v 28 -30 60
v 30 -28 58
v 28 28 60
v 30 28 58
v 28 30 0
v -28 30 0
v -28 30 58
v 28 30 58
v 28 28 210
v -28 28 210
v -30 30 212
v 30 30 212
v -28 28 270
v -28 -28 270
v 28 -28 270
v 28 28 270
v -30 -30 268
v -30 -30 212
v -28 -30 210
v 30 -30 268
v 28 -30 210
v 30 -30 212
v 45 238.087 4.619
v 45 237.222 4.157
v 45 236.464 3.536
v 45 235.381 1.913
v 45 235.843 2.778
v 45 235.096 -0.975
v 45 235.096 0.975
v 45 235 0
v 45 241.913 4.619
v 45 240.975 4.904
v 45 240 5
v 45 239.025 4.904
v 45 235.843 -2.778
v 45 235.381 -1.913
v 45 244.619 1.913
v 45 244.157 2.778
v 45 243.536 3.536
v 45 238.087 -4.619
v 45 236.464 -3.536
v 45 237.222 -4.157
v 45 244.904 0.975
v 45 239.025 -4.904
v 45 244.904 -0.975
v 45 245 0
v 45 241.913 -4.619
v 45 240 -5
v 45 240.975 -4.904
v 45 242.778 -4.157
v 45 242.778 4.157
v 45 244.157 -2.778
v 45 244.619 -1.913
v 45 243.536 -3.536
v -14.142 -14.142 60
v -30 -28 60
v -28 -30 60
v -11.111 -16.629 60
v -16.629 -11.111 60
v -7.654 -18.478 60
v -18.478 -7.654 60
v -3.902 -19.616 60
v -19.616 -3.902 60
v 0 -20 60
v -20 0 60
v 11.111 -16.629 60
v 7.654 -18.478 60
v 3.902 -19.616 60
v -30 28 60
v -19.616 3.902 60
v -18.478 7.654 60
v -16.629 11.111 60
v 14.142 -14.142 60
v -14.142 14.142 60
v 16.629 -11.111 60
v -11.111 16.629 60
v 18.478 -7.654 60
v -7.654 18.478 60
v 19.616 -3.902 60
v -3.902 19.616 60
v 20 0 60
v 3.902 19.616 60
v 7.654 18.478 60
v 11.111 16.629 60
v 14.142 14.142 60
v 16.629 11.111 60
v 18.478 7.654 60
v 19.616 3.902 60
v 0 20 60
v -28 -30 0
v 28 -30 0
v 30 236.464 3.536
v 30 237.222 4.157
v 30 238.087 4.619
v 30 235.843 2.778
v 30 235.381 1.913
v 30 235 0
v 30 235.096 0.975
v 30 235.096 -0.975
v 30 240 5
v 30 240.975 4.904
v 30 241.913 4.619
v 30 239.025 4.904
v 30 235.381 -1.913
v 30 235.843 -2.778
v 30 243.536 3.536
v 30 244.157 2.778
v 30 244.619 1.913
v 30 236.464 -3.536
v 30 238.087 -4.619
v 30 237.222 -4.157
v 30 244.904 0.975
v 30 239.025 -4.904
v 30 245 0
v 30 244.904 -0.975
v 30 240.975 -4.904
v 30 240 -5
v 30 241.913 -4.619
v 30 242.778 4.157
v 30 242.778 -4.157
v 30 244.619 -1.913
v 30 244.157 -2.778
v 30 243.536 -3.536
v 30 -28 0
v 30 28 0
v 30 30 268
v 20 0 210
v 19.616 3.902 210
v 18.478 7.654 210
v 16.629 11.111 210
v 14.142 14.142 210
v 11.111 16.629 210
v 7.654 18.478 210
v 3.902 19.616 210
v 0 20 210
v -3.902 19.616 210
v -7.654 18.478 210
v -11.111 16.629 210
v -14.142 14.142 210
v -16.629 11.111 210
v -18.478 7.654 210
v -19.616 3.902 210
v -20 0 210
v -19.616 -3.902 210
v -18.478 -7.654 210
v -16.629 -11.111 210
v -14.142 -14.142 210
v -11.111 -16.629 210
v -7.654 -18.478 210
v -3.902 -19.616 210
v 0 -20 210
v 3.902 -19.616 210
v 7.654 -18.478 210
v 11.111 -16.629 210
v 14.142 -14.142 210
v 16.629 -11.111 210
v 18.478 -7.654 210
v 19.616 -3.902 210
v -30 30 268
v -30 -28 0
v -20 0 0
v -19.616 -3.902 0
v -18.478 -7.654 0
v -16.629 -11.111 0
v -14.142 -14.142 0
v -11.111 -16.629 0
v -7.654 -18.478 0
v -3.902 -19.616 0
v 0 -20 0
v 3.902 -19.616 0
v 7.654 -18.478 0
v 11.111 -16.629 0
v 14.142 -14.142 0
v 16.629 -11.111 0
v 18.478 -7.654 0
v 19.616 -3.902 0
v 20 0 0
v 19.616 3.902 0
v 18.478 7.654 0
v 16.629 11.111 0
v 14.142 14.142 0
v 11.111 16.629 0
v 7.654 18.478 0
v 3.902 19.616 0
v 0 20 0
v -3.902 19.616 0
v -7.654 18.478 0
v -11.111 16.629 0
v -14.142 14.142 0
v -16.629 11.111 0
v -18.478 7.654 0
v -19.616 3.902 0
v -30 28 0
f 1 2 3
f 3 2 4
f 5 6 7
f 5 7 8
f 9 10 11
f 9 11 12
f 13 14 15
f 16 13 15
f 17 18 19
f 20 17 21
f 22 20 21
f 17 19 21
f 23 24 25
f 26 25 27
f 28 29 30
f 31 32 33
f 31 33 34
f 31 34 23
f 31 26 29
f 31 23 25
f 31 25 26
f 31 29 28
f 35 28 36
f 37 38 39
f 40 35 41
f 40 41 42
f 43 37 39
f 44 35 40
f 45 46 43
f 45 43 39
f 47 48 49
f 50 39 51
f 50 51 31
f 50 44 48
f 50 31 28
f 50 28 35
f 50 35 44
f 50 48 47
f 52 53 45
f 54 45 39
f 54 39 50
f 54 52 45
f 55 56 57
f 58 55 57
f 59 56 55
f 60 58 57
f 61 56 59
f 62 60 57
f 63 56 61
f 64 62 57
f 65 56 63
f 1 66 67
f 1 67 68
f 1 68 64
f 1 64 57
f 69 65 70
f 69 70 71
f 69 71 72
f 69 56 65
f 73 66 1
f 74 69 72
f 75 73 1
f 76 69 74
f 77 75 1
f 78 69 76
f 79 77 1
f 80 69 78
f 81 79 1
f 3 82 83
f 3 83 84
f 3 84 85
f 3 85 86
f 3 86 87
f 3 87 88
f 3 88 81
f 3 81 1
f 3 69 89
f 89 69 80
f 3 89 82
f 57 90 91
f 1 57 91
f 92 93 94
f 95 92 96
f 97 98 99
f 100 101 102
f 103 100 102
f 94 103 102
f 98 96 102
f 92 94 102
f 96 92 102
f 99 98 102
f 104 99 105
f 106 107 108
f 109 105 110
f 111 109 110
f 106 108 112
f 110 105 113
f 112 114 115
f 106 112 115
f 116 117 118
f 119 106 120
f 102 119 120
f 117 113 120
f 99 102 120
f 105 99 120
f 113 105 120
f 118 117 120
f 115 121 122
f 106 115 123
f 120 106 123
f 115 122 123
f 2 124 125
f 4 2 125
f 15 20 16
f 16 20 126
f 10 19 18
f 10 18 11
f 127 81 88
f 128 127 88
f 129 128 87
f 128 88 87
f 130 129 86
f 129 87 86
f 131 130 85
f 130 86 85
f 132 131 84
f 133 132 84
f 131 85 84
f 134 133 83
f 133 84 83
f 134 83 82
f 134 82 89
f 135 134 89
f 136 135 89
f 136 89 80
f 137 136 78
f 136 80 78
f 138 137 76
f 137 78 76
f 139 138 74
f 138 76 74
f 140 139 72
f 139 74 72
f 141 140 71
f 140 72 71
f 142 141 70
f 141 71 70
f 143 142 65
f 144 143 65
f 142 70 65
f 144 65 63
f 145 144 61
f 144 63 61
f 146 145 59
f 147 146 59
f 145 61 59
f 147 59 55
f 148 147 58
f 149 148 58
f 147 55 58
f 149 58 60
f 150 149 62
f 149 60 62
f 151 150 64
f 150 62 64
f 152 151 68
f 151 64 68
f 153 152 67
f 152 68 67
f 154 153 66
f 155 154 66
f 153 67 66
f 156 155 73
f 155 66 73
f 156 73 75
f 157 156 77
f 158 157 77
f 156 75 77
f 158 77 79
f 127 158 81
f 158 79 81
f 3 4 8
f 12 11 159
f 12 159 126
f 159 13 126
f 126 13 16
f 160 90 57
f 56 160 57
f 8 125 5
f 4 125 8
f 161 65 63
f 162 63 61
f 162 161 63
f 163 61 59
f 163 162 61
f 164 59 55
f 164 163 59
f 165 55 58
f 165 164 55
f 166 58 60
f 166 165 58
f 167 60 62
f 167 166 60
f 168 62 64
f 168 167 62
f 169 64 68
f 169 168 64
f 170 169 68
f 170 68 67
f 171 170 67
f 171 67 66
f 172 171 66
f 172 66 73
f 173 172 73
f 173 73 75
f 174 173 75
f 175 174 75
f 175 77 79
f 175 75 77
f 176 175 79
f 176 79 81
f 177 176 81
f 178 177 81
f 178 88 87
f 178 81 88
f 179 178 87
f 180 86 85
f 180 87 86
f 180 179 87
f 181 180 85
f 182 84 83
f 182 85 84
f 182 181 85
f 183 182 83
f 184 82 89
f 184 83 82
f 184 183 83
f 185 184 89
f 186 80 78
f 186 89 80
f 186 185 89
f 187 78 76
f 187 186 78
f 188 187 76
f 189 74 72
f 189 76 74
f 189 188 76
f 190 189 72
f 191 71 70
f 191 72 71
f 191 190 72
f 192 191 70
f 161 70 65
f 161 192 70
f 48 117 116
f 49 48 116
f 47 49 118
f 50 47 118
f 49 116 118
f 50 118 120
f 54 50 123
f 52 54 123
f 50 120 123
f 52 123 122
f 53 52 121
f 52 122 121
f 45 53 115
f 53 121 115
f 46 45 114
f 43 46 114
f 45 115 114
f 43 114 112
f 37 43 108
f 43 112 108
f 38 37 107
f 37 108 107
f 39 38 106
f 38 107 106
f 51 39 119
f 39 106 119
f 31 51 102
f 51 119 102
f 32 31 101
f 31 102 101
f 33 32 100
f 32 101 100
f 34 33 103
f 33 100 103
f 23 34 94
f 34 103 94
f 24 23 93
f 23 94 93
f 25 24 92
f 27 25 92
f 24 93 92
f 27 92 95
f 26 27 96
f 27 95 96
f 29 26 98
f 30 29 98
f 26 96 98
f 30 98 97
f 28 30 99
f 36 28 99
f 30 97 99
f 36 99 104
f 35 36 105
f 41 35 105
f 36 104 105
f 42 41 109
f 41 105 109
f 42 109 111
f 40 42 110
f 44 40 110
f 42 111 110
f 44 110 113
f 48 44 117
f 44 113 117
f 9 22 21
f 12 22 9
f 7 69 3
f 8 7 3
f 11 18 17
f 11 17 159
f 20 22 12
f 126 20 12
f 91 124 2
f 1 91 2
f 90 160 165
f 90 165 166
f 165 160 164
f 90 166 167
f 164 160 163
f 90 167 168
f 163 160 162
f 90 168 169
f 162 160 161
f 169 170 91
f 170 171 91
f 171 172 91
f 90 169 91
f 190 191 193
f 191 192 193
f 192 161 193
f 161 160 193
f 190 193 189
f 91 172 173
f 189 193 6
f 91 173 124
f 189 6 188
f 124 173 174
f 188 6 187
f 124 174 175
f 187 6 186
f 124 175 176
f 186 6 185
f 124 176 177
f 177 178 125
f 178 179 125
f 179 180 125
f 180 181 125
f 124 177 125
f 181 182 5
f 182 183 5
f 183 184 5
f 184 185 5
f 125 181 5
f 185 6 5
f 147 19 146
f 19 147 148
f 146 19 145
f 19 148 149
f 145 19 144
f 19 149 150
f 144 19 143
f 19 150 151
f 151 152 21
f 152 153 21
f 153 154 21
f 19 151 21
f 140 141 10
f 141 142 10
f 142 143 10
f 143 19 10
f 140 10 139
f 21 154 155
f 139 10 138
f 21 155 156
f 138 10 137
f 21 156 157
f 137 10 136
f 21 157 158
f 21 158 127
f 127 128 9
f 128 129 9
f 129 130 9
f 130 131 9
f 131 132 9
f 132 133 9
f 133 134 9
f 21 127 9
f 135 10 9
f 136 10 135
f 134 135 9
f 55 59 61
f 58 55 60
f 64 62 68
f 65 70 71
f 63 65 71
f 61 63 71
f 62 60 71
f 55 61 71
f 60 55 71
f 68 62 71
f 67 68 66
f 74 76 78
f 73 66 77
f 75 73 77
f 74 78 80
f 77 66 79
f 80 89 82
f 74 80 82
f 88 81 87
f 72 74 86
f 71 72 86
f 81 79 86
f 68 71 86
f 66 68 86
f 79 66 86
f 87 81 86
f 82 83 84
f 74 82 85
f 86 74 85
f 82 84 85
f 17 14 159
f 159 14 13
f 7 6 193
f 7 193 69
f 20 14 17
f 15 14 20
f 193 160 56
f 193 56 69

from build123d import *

# Parameters (mm, degrees)
SKETCH1_W           = 60
SKETCH1_H           = 60
BOSS_EXTRUDE1_DEPTH = 60
SKETCH2_R           = 20
CUT_EXTRUDE1_DEPTH  = 61
SKETCH3_R           = 20
BOSS_EXTRUDE2_DEPTH = 150
SKETCH4_W           = 60
SKETCH4_H           = 60
BOSS_EXTRUDE3_DEPTH = 60
CHAMFER1_SIZE       = 2
CHAMFER3_SIZE       = 2
SKETCH5_R           = 5
BOSS_EXTRUDE4_DEPTH = 15


with BuildPart() as part:
    # Sketch1 → Boss-Extrude1 (new body)
    with BuildSketch(Plane.XY):
        Rectangle(SKETCH1_W, SKETCH1_H)
    extrude(amount=BOSS_EXTRUDE1_DEPTH)

    # Sketch2 → Cut-Extrude1 (cut)
    with BuildSketch(Plane.XY):
        Circle(SKETCH2_R)
    extrude(amount=CUT_EXTRUDE1_DEPTH, mode=Mode.SUBTRACT)

    # Chamfer1
    chamfer1_edges = [part.edges().sort_by_distance(p)[0] for p in [
        (-30, -30, 30),
        (-30, 30, 30),
        (30, -30, 30),
        (30, 30, 30),
        (30, 0, 60),
        (0, 30, 60),
    ]]
    chamfer(chamfer1_edges, length=CHAMFER1_SIZE)


with BuildPart() as body_2:
    # Sketch3 → Boss-Extrude2 (new body)
    with BuildSketch(Plane.XY.offset(60)):
        Circle(SKETCH3_R)
    extrude(amount=BOSS_EXTRUDE2_DEPTH)

    # Sketch4 → Boss-Extrude3 (add)
    with BuildSketch(Plane.XY.offset(210)):
        Rectangle(SKETCH4_W, SKETCH4_H)
    extrude(amount=BOSS_EXTRUDE3_DEPTH)

    # Chamfer3
    chamfer3_edges = [body_2.edges().sort_by_distance(p)[0] for p in [
        (0, -30, 270),
        (-30, 0, 270),
        (0, 30, 270),
        (30, 0, 270),
        (-30, 0, 210),
        (0, 30, 210),
        (30, 0, 210),
    ]]
    chamfer(chamfer3_edges, length=CHAMFER3_SIZE)


with BuildPart() as body_3:
    # Sketch5 → Boss-Extrude4 (new body)
    with BuildSketch(Plane(origin=(30, 0, 0), x_dir=(0, 0, -1), z_dir=(1, 0, 0))):
        with Locations((0, 240)):
            Circle(SKETCH5_R)
    extrude(amount=BOSS_EXTRUDE4_DEPTH)


solid = Compound([part.part, body_2.part, body_3.part])
